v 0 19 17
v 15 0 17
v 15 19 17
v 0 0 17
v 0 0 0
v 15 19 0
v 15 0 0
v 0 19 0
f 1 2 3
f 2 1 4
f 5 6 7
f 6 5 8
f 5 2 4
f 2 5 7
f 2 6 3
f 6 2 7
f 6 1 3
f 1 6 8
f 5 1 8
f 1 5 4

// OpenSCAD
// Generated by SolidPython 1.0.1 on 2020-07-29 00:46:56


cube(size = [15, 19, 17]);
/***********************************************
*********      SolidPython code:      **********
************************************************
 
# import packages: SolidPython
from solid import *
from solid.utils import *
from itertools import chain, combinations, permutations


class Resize:

    def __init__(self, scad_file):
        self.scad_file = scad_file
        #self.scad_file = import_scad(scad_file)
        # cone/cylinder param:
        self.r1 = 0
        self.r2 = 0
        self.h = 0
        # rectangular prism param:
        self.w = 0
        self.l = 0
        # ellipse param:
        self.r = 0

    # import OpenScad code (file name corresponds to shape)


    # classify shape + parameters
    def assign(self, param1, param2, param3):
        if self.scad_file == 'cone.scad':
            self.r1 = param1
            self.r2 = param2
            self.h = param3
        elif self.scad_file == 'cylinder.scad':
            self.r1 = param1
            self.r2 = param2
            self.h = param3
        elif self.scad_file == 'rectangularPrism.scad':
            self.h = param1
            self.l = param2
            self.w = param3
        else:
            self.r = param1
            self.h = param2

    # resize parameters
    def iterate(self):
        x = range(3, 20, 2)
        i = 1
        if self.scad_file == 'cone.scad':
            tempList = list(permutations(x, 2))
            for temp in tempList:
                param1 = temp[0]
                param2 = temp[1]
                filepath = 'produced_scad_files/' + 'cone' + str(param1) + '_' + str(param2) + '_' + '.scad'
                scad_render_to_file(cylinder(h=param1, r1=param2, r2=0), filepath)

        elif self.scad_file == 'cylinder.scad':
            tempList = list(permutations(x, 3))
            for temp in tempList:
                param1 = temp[0]
                param2 = temp[1]
                filepath = 'produced_scad_files/' + 'cylinder' + str(param1) + '_' + str(param2) + '_' + '.scad'
                scad_render_to_file(cylinder(h=param1, r1=param2, r2=param2), filepath)

        elif self.scad_file == 'rectangularPrism.scad':
            tempList = list(permutations(x, 3))
            for temp in tempList:
                param1 = temp[0]
                param2 = temp[1]
                param3 = temp[2]
                filepath = 'produced_scad_files/' + 'rectangularPrism' + str(param1) + '_' + str(param2) + '_' + str(
                    param3) + '.scad'
                scad_render_to_file(cube(size=(param1, param2, param3)), filepath)

        elif self.scad_file == 'ellipse.scad':
            tempList = list(permutations(x, 4))
            for temp in tempList:
                param1 = temp[0]
                param2 = temp[1]
                param3 = temp[2]
                param4 = temp[3]
                filepath = 'produced_scad_files/' + 'ellipse' + str(param1) + '_' + str(param2) + '_' + str(param3) + '_' + str(param4) + '.scad'
                scad_render_to_file(scale([param1, param2, param3])(sphere(r=param4)), filepath)

    def render_to_scadfile(self):
        scad_render_to_file(scad, 'example.scad') 
 
************************************************/
